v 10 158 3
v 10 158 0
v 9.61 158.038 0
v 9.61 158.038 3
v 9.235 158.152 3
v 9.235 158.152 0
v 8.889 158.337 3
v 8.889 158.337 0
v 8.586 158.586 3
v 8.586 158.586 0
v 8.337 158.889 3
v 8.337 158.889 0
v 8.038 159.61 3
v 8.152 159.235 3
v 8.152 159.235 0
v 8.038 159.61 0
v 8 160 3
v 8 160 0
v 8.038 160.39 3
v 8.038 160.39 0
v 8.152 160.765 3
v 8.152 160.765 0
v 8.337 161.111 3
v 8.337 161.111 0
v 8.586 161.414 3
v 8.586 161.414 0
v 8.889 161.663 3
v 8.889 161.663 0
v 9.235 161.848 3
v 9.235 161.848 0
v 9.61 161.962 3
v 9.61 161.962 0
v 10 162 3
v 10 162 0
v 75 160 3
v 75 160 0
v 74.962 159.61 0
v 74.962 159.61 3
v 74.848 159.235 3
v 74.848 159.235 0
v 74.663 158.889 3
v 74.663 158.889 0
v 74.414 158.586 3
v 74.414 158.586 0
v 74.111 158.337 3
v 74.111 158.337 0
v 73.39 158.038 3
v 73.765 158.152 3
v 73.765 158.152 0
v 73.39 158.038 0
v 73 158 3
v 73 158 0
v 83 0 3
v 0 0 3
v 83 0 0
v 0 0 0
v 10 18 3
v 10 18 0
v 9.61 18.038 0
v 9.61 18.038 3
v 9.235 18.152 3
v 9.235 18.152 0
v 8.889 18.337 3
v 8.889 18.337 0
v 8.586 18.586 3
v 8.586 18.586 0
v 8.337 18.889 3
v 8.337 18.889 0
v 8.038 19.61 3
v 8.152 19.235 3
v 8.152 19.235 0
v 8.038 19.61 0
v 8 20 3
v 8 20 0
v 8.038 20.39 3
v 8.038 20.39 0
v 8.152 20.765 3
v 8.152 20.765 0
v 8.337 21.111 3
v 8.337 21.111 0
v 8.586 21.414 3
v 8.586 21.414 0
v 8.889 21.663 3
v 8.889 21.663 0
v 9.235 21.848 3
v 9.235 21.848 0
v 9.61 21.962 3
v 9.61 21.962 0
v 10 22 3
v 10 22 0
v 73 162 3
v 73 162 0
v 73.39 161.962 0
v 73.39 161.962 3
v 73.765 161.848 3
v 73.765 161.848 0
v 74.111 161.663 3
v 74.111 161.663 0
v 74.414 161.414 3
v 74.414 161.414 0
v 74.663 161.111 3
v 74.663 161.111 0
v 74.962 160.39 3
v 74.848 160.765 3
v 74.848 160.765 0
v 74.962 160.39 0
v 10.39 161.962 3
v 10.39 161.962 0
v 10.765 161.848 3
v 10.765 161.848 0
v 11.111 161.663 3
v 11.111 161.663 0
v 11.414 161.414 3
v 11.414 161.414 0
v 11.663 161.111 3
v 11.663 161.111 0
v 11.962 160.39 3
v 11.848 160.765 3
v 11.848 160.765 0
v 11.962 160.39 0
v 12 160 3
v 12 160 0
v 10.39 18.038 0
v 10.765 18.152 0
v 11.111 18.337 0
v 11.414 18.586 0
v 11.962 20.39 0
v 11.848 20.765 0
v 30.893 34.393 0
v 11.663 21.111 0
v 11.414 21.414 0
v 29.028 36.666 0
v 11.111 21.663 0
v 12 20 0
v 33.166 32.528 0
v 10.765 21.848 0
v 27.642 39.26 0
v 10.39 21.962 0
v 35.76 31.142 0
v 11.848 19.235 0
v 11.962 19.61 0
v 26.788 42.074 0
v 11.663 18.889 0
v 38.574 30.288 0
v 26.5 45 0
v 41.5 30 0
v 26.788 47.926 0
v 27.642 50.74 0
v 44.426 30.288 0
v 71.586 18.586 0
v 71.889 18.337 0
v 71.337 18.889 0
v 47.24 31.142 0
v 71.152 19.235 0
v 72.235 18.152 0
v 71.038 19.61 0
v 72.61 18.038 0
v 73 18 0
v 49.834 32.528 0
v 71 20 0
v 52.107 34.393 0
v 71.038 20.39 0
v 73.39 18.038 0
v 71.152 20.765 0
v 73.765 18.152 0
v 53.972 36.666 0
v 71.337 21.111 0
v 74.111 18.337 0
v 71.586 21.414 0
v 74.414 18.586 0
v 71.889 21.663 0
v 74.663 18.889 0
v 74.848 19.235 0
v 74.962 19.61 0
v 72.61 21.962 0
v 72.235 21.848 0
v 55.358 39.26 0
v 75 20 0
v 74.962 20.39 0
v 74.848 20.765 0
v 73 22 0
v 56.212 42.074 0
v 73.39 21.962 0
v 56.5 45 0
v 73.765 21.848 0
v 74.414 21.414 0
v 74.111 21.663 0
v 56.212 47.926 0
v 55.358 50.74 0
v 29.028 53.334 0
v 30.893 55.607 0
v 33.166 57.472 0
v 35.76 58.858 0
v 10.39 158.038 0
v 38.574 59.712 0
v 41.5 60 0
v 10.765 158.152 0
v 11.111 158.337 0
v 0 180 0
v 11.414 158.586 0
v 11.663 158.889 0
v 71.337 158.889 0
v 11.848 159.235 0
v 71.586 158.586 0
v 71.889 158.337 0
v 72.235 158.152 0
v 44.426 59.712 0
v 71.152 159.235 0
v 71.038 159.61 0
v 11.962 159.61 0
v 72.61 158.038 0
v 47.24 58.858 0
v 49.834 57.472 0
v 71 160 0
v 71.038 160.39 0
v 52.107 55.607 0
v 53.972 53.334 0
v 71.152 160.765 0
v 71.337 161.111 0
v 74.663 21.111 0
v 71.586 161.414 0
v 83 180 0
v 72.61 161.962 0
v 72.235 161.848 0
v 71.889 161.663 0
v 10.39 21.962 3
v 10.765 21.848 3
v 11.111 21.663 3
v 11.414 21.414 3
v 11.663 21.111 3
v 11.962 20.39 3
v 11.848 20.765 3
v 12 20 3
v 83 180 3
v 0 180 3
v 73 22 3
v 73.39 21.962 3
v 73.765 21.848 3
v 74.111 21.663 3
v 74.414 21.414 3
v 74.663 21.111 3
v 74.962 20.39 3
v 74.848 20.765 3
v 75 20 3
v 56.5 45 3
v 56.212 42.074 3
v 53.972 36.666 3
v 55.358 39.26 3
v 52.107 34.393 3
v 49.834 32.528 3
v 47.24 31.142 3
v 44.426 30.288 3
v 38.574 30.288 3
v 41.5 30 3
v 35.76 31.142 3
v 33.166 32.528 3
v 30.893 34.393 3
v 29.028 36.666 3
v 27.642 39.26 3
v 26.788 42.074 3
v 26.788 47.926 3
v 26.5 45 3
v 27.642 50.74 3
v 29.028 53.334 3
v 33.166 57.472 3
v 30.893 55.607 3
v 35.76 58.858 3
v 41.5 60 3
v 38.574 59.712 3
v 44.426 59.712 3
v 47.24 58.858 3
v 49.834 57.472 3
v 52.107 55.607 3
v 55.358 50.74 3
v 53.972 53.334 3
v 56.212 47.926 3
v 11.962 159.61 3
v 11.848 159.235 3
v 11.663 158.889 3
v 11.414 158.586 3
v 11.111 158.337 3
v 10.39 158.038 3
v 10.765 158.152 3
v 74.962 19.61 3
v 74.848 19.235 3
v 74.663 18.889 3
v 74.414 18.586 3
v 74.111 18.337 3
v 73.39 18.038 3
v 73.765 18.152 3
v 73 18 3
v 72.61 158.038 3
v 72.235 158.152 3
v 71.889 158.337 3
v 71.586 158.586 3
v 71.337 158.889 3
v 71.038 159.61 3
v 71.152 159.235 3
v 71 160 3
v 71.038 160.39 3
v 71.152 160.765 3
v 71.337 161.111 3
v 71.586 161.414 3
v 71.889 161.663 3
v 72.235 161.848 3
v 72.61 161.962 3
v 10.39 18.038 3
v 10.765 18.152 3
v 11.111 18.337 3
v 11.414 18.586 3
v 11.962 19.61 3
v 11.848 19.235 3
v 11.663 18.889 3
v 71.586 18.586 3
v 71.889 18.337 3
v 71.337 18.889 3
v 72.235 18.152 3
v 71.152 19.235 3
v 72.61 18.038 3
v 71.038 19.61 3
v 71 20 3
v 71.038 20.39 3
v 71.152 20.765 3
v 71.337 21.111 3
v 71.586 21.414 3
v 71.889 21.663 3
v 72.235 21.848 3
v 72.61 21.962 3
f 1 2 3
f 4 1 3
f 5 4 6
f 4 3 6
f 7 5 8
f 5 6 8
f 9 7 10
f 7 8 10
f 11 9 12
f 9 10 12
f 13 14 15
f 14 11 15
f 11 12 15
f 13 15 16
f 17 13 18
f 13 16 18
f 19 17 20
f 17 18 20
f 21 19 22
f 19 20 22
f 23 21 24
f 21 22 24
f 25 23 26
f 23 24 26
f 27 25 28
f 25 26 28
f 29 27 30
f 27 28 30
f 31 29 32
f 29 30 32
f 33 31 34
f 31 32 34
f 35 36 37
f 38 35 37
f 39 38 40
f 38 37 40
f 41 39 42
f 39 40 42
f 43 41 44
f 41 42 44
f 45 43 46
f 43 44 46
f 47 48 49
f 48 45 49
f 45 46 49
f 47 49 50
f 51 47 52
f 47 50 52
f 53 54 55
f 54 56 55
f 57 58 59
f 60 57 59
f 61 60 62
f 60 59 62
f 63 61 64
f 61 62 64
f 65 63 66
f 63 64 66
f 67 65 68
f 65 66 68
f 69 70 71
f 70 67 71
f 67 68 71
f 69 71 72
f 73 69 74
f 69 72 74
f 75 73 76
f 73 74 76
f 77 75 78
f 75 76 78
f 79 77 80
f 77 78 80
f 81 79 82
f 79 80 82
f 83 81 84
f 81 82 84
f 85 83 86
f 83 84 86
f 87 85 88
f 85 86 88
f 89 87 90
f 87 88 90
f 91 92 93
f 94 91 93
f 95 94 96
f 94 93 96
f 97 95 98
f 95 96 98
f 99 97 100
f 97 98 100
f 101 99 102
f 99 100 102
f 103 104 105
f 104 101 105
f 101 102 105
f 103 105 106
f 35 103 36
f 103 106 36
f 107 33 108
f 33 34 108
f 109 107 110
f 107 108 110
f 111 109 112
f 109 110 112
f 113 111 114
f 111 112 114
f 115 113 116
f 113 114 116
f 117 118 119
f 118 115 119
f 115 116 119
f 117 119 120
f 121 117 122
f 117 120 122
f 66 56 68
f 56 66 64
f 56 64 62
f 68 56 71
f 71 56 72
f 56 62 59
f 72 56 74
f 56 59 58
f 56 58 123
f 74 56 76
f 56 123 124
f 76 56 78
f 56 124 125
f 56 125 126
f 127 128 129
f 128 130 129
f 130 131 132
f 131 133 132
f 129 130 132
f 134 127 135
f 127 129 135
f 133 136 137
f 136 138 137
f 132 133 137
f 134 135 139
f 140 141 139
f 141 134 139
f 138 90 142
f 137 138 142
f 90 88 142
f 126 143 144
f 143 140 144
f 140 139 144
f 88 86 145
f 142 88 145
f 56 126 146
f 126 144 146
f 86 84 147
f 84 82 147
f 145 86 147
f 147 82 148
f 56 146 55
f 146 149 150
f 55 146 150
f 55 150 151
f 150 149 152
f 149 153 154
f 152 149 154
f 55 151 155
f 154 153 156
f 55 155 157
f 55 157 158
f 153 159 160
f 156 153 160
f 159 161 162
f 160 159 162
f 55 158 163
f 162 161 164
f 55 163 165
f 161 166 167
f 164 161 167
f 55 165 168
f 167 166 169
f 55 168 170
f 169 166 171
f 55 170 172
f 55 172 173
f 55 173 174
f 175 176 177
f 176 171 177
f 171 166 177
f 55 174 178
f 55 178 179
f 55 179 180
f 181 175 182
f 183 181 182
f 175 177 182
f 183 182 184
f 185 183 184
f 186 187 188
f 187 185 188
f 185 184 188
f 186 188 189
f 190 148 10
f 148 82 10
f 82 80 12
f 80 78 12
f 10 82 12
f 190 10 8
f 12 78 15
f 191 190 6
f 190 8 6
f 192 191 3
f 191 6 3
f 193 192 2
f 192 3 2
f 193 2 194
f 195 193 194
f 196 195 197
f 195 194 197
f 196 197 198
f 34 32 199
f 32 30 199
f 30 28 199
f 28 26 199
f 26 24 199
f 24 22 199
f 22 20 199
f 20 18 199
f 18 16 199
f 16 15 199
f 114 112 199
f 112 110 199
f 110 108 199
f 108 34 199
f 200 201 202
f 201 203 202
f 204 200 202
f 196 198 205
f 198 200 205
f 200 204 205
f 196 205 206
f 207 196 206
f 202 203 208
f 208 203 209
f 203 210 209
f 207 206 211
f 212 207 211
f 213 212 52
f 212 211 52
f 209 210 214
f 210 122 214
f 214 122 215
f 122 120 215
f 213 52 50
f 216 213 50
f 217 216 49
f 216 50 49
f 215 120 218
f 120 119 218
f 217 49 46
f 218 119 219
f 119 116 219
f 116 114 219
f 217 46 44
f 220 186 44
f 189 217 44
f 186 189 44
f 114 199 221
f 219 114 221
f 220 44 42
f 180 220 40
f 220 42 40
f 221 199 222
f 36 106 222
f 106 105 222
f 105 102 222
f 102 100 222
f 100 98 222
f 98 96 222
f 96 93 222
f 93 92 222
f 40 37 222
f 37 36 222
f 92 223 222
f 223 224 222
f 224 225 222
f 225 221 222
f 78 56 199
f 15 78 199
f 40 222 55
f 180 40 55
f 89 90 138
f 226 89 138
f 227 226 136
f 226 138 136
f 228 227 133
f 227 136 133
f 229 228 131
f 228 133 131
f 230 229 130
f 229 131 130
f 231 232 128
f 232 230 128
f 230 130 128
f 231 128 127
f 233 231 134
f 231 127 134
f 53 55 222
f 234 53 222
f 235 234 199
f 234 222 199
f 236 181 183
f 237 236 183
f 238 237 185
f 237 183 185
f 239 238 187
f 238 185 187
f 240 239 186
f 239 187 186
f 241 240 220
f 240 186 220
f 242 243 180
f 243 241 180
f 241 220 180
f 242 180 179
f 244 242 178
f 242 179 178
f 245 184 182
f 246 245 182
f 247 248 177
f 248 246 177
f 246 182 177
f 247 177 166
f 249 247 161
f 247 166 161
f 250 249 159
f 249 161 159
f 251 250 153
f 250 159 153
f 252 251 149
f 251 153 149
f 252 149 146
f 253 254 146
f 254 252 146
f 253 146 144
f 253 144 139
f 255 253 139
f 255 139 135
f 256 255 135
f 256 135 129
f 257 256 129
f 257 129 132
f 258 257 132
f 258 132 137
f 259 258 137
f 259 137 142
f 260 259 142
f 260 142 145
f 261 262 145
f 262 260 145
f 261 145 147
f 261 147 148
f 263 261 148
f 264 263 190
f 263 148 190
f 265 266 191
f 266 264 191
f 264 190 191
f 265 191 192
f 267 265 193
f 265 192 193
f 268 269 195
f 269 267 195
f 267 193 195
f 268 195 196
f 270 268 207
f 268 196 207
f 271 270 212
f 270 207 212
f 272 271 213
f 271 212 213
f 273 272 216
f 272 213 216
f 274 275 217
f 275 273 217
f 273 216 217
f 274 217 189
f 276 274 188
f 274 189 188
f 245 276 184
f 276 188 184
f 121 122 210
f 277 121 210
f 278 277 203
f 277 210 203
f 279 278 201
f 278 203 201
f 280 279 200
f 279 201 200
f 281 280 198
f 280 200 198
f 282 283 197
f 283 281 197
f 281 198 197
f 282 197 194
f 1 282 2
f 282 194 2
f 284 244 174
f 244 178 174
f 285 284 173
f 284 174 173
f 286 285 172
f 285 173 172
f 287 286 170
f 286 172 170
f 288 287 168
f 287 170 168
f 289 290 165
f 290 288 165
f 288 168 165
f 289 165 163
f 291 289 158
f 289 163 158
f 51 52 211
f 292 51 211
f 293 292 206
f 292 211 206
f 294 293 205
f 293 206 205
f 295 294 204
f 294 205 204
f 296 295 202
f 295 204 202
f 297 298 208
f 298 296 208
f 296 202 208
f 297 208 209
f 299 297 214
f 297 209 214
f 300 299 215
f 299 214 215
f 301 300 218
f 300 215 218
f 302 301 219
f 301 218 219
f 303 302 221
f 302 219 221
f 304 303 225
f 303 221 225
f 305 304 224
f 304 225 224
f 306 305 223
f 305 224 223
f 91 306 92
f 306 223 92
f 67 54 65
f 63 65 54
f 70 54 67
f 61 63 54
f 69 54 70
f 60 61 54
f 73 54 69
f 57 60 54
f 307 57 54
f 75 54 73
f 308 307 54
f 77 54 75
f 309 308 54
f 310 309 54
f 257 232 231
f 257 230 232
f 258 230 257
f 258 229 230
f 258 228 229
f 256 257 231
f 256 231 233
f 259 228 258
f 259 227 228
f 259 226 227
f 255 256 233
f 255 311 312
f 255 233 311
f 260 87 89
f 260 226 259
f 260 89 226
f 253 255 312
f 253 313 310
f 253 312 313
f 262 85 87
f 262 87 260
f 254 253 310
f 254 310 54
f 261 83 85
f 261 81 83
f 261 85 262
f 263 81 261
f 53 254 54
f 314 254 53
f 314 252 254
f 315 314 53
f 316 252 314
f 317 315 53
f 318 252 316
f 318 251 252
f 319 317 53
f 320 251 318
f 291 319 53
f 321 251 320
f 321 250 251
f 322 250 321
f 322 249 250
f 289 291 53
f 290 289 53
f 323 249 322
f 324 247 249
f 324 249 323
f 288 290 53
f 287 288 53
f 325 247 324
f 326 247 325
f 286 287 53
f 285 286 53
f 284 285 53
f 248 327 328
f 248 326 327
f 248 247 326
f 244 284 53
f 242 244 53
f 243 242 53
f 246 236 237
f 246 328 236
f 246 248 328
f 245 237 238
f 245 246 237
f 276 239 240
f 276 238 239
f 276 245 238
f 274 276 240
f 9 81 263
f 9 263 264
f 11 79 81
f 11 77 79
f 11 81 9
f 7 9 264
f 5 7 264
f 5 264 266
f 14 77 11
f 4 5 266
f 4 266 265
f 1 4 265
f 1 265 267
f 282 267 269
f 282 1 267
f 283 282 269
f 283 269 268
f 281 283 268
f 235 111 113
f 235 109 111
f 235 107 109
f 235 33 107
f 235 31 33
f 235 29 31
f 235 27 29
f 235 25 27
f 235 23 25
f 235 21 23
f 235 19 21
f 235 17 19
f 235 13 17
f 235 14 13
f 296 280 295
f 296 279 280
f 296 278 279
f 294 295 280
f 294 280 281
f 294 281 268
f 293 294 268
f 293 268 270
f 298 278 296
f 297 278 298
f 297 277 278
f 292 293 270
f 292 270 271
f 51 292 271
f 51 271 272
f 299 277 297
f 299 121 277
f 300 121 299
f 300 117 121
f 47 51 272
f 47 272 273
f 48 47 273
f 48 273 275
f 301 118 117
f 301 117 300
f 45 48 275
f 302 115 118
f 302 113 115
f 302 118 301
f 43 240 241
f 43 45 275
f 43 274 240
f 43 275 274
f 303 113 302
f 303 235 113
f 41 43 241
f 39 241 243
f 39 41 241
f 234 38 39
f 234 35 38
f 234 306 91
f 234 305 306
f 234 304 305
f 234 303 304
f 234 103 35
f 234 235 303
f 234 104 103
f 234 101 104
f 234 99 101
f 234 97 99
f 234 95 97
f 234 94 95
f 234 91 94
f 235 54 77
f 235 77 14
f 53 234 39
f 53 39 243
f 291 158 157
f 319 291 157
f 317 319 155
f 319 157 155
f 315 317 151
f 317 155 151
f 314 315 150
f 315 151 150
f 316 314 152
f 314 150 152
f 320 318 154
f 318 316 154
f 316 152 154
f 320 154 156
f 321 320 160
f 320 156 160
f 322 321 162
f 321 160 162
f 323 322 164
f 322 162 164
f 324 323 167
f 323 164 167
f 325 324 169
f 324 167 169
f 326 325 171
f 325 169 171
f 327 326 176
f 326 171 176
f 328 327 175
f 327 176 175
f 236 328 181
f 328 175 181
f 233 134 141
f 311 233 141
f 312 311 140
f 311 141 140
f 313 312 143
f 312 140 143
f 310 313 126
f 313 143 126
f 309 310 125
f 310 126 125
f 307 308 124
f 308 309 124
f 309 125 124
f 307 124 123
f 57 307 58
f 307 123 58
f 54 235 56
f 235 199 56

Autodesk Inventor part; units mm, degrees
ref_plane "YZ Plane" through (0, 0, 0) normal (1, 0, 0) x (0, 1, 0)
ref_plane "XZ Plane" through (0, 0, 0) normal (0, 1, 0) x (-1, 0, 0)
ref_plane "XY Plane" through (0, 0, 0) normal (0, 0, 1) x (1, 0, 0)
sketch "Sketch1" plane through (0, 0, 0) normal (0, 0, 1) x (1, 0, 0)
  line L0 (83, 0) -> (83, 180)
  line L1 (83, 180) -> (0, 180)
  line L2 (0, 180) -> (0, 0)
  circle A0 centre (41.5, 45) radius 15
  line L3 (0, 0) -> (83, 0)
  line L4 (10, 171.8151) -> (10, 9.9445)
  line L5 (73, 174.9264) -> (73, 13.0559)
  circle A1 centre (10, 160) radius 2
  circle A2 centre (73, 160) radius 2
  circle A3 centre (10, 20) radius 2
  circle A4 centre (73, 20) radius 2
  dimension "d0" = 83
  dimension "d1" = 180
  dimension "d4" = 30
  dimension "d5" = 41.5
  dimension "d10" = 10
  dimension "d11" = 10
  dimension "d12" = 4
  dimension "d13" = 20
  dimension "d14" = 20
  dimension "d15" = 20
  dimension "d16" = 20
  dimension "d17" = 4
  dimension "d18" = 4
  dimension "d19" = 4
extrude "Extrusion1" add sketch "Sketch1" along normal blind 3
equation "\"d5\" = 0.5 * d0"
equation "\"d11\" = d10"
equation "\"d14\" = d13"
equation "\"d15\" = d13"
equation "\"d16\" = d13"
equation "\"d17\" = d12"
equation "\"d18\" = d12"
equation "\"d19\" = d18"
equation "\"d6\" = 0.25 * d1"
properties part number "BaseC_3" material "PMMA Plastic"
